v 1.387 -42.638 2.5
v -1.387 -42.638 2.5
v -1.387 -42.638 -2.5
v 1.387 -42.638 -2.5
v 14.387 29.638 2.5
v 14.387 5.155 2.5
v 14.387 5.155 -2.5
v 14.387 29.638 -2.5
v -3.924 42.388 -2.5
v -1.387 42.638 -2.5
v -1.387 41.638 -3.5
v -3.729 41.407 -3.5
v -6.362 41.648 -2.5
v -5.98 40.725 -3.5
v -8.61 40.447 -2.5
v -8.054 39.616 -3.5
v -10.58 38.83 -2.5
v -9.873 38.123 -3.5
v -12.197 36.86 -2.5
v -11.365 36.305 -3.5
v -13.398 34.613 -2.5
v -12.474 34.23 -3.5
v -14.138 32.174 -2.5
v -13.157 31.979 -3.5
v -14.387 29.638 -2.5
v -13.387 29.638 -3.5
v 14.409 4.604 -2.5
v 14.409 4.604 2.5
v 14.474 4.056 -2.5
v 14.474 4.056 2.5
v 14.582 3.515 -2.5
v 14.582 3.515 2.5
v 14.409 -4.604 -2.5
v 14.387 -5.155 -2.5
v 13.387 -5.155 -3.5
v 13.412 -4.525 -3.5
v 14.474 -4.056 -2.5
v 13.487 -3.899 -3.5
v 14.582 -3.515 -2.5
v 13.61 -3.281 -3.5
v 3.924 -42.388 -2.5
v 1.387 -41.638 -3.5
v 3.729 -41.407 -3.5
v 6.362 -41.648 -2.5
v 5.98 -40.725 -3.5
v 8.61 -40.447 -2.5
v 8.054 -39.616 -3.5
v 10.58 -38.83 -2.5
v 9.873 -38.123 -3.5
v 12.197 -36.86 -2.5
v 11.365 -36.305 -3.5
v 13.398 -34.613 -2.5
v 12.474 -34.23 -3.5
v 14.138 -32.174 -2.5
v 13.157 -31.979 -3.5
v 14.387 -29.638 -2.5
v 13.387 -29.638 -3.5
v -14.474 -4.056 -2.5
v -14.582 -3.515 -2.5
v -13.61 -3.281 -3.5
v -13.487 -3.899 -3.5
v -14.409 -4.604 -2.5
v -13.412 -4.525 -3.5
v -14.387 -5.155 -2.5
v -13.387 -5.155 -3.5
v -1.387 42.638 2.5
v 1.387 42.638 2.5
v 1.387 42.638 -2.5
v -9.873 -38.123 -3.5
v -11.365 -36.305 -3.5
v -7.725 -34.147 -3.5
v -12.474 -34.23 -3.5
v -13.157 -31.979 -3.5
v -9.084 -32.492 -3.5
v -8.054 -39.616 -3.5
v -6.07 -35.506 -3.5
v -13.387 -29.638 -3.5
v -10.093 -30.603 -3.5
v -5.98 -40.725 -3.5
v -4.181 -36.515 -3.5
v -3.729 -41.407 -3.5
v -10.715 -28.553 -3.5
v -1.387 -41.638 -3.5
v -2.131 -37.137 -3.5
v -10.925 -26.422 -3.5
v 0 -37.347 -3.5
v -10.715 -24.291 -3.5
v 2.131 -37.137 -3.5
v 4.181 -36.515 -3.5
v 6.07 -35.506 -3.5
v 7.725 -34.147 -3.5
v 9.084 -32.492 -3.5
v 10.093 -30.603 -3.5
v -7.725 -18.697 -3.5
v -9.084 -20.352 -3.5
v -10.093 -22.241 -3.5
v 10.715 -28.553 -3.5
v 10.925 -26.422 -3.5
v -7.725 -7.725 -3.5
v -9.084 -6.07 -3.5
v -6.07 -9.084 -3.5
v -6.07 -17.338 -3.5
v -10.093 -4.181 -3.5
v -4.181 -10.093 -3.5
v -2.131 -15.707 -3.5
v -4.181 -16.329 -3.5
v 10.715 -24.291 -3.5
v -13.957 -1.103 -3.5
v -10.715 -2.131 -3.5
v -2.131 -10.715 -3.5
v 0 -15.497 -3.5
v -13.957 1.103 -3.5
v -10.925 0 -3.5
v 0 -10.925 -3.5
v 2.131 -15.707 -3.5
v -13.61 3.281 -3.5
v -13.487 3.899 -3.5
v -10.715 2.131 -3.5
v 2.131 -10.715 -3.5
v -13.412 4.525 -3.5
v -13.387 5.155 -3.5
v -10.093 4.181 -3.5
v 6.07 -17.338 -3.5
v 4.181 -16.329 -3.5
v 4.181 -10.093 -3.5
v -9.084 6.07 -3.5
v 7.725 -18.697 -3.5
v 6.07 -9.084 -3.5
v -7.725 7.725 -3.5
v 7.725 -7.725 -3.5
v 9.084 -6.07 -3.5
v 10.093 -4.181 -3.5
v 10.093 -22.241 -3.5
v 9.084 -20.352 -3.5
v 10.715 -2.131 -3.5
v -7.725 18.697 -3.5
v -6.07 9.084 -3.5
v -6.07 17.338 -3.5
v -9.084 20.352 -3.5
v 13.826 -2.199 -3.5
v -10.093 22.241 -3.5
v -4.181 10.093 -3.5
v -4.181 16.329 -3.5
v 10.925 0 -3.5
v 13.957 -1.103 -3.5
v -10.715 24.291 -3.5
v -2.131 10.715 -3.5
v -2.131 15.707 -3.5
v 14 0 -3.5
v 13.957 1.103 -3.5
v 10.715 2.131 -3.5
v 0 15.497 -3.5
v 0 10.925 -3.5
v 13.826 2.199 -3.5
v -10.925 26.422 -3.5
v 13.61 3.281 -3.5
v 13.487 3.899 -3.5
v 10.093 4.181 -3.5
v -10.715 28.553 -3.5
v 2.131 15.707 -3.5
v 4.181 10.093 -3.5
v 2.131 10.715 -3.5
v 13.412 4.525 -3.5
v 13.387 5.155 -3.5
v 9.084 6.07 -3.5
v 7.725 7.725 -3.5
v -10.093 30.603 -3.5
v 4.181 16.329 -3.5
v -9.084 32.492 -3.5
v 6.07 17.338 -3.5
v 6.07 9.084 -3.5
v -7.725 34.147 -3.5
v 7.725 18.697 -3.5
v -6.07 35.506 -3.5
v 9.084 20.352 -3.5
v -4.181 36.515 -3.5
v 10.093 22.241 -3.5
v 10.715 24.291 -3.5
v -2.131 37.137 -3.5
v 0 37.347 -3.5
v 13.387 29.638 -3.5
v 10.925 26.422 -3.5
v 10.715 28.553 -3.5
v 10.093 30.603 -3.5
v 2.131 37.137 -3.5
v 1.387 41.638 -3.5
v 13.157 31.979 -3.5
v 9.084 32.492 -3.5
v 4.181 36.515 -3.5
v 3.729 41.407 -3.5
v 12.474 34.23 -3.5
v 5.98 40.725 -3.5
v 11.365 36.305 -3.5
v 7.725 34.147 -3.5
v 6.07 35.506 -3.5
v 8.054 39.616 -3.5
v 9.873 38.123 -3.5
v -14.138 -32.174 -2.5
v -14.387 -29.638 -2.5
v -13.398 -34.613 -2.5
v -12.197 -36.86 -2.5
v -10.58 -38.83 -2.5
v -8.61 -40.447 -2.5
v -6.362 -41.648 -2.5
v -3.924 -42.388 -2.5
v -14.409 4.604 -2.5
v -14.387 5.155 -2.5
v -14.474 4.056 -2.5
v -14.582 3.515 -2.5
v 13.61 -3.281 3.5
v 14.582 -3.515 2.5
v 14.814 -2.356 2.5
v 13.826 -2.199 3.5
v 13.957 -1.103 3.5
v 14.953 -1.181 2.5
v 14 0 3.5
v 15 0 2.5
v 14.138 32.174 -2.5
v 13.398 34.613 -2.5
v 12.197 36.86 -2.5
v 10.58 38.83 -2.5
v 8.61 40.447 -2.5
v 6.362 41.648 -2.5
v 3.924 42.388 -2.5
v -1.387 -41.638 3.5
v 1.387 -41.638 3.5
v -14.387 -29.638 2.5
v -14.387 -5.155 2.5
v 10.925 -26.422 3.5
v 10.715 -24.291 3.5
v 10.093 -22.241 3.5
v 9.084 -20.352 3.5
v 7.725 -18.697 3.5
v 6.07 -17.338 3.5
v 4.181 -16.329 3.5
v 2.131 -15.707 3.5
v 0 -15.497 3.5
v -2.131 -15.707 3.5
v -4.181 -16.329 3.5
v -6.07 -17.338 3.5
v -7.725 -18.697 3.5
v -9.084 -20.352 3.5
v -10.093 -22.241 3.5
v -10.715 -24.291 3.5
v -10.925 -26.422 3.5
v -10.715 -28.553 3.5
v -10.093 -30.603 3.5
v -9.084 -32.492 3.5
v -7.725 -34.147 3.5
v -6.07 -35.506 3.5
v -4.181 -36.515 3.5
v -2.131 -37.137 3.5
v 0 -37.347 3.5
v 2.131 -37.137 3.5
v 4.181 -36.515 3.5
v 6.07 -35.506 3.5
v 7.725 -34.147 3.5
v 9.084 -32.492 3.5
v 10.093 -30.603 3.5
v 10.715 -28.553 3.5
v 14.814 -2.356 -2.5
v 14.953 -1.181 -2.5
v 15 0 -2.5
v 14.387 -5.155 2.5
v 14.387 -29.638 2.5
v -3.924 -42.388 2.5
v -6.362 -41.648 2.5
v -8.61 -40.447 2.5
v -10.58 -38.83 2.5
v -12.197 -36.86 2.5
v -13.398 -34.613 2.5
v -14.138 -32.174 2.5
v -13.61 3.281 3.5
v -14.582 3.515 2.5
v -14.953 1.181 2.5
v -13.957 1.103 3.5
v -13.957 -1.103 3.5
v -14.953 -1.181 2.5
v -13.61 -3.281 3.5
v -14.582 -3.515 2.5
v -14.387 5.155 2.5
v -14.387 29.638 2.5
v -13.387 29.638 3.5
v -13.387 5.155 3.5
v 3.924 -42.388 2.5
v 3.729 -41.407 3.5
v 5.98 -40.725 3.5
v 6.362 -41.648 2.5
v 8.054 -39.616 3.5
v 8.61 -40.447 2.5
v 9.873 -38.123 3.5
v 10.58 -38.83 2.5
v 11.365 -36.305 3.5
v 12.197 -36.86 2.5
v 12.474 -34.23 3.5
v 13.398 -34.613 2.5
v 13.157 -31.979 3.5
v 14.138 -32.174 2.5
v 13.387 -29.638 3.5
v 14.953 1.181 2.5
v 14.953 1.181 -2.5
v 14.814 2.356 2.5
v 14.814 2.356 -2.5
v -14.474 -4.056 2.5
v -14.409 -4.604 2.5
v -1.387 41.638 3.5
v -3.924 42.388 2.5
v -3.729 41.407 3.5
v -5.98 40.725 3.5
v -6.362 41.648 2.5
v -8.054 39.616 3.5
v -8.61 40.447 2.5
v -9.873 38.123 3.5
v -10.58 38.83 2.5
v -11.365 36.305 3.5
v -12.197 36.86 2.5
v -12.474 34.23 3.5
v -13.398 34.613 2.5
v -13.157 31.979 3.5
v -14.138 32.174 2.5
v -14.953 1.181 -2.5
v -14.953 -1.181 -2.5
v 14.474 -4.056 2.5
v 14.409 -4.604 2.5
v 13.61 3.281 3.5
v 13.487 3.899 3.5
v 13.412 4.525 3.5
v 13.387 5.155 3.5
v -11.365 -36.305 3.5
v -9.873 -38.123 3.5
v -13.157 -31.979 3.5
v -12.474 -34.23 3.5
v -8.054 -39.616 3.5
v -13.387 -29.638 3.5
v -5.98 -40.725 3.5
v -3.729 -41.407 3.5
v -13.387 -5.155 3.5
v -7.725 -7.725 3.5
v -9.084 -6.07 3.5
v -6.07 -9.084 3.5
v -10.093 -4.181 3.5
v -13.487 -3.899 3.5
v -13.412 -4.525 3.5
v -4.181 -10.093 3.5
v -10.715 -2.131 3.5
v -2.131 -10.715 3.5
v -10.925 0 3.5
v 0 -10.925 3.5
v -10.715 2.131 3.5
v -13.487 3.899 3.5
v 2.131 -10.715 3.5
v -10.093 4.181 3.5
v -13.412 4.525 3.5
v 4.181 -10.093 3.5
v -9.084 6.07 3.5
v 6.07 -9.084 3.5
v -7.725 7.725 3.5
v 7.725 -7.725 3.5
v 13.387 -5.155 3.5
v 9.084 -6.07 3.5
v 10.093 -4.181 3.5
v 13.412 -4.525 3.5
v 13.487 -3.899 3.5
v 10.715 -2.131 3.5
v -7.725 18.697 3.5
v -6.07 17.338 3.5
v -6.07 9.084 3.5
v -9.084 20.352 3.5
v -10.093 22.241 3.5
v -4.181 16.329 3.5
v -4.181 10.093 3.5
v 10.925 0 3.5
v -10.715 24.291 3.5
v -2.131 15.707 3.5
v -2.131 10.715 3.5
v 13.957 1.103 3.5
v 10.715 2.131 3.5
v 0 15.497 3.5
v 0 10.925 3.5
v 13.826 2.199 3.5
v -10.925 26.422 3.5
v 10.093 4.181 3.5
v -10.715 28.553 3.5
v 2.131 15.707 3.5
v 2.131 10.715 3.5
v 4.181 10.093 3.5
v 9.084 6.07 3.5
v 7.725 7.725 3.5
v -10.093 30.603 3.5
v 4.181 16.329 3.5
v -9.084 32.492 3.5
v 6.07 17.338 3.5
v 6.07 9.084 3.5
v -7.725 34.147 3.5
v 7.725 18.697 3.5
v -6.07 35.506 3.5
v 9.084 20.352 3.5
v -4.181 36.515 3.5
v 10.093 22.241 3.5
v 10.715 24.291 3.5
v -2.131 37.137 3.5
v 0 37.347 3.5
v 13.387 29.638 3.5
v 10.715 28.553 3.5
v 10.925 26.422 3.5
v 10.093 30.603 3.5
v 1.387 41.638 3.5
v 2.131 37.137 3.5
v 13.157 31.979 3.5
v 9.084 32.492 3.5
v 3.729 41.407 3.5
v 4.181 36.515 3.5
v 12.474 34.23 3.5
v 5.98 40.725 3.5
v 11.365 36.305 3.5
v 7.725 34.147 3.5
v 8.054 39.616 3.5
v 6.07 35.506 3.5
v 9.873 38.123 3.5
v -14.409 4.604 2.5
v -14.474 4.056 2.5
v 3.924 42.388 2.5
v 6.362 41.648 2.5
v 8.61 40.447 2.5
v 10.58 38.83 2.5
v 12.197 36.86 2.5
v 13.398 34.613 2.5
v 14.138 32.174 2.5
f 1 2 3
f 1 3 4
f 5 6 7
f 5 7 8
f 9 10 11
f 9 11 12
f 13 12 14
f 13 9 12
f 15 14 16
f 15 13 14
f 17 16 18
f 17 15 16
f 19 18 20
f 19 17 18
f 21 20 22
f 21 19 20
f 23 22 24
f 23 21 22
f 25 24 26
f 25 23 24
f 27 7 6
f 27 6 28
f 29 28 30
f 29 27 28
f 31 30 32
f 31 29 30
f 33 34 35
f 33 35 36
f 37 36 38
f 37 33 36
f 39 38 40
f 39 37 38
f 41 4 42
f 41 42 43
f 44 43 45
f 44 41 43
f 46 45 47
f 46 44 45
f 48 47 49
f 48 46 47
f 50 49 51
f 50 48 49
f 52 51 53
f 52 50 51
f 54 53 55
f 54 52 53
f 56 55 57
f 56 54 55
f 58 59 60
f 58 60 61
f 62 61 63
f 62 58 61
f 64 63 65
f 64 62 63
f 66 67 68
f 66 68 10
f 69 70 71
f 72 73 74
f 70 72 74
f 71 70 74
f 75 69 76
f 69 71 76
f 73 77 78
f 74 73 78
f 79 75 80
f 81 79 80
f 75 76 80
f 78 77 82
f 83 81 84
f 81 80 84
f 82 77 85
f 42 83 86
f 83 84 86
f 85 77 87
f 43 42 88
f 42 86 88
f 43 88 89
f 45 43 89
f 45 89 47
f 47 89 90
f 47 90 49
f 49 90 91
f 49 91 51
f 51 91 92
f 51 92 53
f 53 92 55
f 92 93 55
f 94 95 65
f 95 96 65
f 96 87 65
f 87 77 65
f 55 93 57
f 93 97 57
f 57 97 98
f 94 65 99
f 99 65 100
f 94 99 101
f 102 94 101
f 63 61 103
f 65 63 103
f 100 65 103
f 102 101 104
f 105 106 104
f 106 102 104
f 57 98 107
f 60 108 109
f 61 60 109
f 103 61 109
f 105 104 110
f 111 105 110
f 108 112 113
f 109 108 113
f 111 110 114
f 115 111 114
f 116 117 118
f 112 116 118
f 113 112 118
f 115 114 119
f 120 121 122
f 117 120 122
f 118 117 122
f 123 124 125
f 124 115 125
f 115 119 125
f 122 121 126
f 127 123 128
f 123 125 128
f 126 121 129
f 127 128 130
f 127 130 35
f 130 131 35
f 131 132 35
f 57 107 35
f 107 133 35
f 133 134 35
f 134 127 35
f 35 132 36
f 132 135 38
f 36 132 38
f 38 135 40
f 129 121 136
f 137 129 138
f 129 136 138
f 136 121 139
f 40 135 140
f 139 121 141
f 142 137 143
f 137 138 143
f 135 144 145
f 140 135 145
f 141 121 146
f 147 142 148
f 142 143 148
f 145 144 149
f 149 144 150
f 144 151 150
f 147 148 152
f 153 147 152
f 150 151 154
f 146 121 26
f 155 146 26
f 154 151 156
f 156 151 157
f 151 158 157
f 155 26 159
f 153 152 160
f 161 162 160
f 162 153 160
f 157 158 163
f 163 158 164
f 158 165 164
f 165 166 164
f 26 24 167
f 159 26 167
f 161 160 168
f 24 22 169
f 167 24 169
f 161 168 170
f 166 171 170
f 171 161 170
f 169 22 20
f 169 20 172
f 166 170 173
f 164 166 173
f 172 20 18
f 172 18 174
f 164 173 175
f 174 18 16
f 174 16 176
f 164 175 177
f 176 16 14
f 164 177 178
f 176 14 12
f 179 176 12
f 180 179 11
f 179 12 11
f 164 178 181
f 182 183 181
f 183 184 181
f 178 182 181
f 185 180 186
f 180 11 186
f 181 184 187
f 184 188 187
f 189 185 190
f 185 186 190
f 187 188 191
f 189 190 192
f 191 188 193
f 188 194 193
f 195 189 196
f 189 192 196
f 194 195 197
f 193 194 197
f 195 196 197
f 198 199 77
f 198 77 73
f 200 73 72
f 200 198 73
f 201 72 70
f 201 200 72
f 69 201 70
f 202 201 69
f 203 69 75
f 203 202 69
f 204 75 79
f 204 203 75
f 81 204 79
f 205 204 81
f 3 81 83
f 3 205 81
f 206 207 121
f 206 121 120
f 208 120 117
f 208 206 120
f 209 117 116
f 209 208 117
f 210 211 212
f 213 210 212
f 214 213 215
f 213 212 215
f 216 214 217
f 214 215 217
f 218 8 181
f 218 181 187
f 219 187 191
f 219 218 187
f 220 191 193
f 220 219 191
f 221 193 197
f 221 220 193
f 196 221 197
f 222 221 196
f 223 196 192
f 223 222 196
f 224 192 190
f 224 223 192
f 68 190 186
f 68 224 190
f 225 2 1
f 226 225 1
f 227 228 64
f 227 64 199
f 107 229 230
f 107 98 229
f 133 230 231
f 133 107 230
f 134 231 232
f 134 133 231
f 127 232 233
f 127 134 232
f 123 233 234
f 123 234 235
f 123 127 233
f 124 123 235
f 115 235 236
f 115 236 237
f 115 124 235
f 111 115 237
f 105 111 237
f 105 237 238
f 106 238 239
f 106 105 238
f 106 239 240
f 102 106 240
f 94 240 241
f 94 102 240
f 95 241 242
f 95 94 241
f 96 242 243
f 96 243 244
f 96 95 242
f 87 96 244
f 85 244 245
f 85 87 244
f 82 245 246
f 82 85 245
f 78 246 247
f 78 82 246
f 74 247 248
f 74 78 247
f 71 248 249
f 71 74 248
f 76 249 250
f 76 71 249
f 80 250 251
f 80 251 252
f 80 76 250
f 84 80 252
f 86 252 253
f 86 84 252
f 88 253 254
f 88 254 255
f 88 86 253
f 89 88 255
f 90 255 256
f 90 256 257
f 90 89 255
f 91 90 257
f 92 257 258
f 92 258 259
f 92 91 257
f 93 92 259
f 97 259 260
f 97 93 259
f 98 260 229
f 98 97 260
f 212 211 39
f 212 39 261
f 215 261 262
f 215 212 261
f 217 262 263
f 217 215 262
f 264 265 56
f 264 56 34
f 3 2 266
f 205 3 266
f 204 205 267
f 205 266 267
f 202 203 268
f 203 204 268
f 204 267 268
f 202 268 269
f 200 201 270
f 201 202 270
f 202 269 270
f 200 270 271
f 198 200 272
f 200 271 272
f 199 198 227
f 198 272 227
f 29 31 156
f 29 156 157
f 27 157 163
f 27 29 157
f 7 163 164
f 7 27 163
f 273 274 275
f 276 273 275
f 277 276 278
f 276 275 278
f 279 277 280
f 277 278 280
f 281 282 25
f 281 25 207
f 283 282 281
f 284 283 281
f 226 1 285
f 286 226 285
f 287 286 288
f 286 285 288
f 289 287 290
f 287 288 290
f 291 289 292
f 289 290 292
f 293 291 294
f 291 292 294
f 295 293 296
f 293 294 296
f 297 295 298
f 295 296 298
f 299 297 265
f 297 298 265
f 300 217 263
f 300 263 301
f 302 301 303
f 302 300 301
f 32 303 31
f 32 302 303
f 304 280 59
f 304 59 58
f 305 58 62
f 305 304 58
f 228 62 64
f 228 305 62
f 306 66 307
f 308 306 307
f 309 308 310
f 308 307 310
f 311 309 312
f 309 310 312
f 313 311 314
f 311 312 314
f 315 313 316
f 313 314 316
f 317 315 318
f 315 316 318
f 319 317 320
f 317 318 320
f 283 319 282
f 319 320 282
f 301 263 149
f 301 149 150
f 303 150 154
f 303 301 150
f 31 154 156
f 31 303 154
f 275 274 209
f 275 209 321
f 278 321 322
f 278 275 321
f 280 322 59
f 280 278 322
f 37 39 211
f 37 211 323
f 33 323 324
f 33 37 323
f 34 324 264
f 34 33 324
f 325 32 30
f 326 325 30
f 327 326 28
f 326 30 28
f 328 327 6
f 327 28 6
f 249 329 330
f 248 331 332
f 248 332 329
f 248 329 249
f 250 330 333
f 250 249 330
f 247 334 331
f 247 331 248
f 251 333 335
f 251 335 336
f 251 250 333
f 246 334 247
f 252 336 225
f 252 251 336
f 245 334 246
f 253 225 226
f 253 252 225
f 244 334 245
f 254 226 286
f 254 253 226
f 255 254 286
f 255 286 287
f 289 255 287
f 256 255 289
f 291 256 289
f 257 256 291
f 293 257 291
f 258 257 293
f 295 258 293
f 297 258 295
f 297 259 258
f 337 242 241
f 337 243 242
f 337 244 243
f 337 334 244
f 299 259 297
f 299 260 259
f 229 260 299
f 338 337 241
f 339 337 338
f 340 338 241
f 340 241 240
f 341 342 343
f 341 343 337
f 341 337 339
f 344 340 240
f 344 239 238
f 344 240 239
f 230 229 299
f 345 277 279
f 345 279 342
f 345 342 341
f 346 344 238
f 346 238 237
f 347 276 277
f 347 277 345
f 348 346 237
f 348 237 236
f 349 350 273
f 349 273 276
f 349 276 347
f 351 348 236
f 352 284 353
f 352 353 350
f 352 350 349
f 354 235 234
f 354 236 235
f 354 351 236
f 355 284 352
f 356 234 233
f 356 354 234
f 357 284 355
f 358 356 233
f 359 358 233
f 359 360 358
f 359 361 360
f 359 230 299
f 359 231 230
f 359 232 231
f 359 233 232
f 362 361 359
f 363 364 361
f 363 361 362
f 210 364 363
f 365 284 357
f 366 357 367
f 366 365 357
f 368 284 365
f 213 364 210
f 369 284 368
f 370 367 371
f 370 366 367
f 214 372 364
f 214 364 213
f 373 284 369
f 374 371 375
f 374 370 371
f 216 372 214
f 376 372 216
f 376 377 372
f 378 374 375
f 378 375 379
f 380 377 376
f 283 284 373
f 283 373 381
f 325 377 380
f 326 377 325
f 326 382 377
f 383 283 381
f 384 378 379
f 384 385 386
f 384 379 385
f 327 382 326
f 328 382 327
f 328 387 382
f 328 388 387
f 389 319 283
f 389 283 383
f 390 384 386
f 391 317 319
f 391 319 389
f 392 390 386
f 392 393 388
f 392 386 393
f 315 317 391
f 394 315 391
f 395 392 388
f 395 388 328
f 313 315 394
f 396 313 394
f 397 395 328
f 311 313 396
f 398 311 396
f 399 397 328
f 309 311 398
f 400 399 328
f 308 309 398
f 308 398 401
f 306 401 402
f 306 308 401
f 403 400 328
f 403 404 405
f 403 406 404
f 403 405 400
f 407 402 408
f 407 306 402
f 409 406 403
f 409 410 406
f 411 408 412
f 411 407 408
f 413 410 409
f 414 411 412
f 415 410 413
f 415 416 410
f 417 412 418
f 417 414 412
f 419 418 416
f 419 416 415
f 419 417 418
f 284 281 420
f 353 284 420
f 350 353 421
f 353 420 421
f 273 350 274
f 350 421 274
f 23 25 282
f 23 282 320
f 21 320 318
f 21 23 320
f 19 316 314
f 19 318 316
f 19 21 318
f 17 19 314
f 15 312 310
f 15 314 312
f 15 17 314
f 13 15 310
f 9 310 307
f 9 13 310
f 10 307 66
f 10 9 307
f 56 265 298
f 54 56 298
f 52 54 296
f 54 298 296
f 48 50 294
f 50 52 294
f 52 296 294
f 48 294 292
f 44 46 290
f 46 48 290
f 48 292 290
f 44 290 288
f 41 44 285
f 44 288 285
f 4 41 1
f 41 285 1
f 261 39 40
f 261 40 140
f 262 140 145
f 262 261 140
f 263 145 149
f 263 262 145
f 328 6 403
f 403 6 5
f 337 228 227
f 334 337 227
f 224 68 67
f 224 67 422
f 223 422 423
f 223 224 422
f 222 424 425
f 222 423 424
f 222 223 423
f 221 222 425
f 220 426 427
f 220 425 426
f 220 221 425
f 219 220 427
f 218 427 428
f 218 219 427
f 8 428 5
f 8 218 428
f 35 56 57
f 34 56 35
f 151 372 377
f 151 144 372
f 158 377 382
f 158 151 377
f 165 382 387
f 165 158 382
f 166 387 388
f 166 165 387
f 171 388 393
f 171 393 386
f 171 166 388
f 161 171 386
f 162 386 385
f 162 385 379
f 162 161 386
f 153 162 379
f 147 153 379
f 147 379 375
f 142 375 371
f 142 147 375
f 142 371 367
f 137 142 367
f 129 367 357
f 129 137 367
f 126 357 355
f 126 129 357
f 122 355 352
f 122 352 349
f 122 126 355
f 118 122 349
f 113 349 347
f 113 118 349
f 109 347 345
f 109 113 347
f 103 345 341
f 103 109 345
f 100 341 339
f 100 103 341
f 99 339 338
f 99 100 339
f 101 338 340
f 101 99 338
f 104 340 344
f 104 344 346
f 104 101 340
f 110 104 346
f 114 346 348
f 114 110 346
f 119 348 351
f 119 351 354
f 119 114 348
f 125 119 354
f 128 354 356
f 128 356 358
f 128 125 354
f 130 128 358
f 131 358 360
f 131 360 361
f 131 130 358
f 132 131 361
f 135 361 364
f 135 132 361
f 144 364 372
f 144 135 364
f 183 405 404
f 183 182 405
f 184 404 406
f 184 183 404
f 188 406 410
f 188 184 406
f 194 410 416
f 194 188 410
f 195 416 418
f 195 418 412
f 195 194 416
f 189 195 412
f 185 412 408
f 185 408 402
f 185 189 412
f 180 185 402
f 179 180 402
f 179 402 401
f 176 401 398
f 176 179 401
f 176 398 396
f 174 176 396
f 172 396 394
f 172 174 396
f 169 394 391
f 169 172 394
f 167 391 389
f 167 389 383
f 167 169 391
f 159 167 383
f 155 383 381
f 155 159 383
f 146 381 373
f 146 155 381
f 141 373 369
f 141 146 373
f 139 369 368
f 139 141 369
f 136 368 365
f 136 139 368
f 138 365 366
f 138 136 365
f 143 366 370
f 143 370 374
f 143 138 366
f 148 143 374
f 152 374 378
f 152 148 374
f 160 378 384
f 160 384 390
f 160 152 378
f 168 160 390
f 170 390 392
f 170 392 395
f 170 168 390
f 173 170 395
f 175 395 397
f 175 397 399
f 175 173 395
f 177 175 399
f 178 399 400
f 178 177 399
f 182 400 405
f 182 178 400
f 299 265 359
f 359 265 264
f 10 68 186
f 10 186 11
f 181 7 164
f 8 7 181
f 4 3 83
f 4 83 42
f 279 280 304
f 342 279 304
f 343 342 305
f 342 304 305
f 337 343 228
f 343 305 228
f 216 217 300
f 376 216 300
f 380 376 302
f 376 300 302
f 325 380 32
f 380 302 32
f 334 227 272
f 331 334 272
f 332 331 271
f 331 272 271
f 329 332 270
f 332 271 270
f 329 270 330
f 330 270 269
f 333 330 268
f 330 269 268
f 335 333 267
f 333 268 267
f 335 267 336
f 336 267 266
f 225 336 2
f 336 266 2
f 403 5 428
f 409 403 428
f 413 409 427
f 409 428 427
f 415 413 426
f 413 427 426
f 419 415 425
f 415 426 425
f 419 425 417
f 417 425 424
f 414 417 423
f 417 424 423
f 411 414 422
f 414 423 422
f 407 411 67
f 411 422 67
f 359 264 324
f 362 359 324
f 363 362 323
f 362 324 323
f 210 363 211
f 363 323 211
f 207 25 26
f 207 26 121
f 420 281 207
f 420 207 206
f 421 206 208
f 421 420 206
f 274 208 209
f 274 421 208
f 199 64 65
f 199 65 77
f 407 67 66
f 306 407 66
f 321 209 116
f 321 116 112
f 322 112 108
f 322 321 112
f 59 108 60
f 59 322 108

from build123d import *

# Parameters (mm, degrees)
F0_R     = 10.925
F1_DEPTH = 3.5
F2_R     = 13
F3_R     = 7
F4_SIZE  = 1


with BuildPart() as f1:
    # F0 (on Top) → F1 (new body, symmetric)
    with BuildSketch(Plane.XY):
        with BuildLine():
            ThreePointArc((-14.387438, 4.242832), (0, 15), (14.387438, 4.242832))
            Line((14.387438, 4.242832), (14.387438, 42.63803))
            Line((14.387438, 42.63803), (-14.387438, 42.63803))
            Line((-14.387438, 42.63803), (-14.387438, 4.242832))
        make_face()
        with Locations((0, 26.42202)):
            Circle(F0_R, mode=Mode.SUBTRACT)
        with BuildLine():
            ThreePointArc((14.387438, -4.242832), (14.84607, -2.143412), (15, 0))
            ThreePointArc((15, 0), (14.84607, 2.143412), (14.387438, 4.242832))
            ThreePointArc((14.387438, 4.242832), (0, 15), (-14.387438, 4.242832))
            ThreePointArc((-14.387438, 4.242832), (-15, 0), (-14.387438, -4.242832))
            ThreePointArc((-14.387438, -4.242832), (0, -15), (14.387438, -4.242832))
        make_face()
        Circle(F0_R, mode=Mode.SUBTRACT)
        with BuildLine():
            Line((14.387438, -42.63803), (14.387438, -4.242832))
            ThreePointArc((14.387438, -4.242832), (0, -15), (-14.387438, -4.242832))
            Line((-14.387438, -4.242832), (-14.387438, -42.63803))
            Line((-14.387438, -42.63803), (14.387438, -42.63803))
        make_face()
        with Locations((0, -26.42202)):
            Circle(F0_R, mode=Mode.SUBTRACT)
    extrude(amount=F1_DEPTH, both=True)

    # F2
    f2_edges = [f1.edges().sort_by_distance(p)[0] for p in [
        (-14.387438, 42.63803, 0),
        (14.387438, 42.63803, 0),
        (14.387438, -42.63803, 0),
        (-14.387438, -42.63803, 0),
    ]]
    fillet(f2_edges, radius=F2_R)

    # F3
    f3_edges = [f1.edges().sort_by_distance(p)[0] for p in [
        (14.387438, -4.242832, -1.75),
        (14.387438, 4.242832, -1.75),
        (-14.387438, 4.242832, 0),
        (-14.387438, -4.242832, 0),
    ]]
    fillet(f3_edges, radius=F3_R)

    # F4
    f4_edges = [f1.edges().sort_by_distance(p)[0] for p in [
        (14.387438, -17.396683, 3.5),
        (14.387438, -17.396683, -3.5),
    ]]
    chamfer(f4_edges, length=F4_SIZE)


solid = f1.part
